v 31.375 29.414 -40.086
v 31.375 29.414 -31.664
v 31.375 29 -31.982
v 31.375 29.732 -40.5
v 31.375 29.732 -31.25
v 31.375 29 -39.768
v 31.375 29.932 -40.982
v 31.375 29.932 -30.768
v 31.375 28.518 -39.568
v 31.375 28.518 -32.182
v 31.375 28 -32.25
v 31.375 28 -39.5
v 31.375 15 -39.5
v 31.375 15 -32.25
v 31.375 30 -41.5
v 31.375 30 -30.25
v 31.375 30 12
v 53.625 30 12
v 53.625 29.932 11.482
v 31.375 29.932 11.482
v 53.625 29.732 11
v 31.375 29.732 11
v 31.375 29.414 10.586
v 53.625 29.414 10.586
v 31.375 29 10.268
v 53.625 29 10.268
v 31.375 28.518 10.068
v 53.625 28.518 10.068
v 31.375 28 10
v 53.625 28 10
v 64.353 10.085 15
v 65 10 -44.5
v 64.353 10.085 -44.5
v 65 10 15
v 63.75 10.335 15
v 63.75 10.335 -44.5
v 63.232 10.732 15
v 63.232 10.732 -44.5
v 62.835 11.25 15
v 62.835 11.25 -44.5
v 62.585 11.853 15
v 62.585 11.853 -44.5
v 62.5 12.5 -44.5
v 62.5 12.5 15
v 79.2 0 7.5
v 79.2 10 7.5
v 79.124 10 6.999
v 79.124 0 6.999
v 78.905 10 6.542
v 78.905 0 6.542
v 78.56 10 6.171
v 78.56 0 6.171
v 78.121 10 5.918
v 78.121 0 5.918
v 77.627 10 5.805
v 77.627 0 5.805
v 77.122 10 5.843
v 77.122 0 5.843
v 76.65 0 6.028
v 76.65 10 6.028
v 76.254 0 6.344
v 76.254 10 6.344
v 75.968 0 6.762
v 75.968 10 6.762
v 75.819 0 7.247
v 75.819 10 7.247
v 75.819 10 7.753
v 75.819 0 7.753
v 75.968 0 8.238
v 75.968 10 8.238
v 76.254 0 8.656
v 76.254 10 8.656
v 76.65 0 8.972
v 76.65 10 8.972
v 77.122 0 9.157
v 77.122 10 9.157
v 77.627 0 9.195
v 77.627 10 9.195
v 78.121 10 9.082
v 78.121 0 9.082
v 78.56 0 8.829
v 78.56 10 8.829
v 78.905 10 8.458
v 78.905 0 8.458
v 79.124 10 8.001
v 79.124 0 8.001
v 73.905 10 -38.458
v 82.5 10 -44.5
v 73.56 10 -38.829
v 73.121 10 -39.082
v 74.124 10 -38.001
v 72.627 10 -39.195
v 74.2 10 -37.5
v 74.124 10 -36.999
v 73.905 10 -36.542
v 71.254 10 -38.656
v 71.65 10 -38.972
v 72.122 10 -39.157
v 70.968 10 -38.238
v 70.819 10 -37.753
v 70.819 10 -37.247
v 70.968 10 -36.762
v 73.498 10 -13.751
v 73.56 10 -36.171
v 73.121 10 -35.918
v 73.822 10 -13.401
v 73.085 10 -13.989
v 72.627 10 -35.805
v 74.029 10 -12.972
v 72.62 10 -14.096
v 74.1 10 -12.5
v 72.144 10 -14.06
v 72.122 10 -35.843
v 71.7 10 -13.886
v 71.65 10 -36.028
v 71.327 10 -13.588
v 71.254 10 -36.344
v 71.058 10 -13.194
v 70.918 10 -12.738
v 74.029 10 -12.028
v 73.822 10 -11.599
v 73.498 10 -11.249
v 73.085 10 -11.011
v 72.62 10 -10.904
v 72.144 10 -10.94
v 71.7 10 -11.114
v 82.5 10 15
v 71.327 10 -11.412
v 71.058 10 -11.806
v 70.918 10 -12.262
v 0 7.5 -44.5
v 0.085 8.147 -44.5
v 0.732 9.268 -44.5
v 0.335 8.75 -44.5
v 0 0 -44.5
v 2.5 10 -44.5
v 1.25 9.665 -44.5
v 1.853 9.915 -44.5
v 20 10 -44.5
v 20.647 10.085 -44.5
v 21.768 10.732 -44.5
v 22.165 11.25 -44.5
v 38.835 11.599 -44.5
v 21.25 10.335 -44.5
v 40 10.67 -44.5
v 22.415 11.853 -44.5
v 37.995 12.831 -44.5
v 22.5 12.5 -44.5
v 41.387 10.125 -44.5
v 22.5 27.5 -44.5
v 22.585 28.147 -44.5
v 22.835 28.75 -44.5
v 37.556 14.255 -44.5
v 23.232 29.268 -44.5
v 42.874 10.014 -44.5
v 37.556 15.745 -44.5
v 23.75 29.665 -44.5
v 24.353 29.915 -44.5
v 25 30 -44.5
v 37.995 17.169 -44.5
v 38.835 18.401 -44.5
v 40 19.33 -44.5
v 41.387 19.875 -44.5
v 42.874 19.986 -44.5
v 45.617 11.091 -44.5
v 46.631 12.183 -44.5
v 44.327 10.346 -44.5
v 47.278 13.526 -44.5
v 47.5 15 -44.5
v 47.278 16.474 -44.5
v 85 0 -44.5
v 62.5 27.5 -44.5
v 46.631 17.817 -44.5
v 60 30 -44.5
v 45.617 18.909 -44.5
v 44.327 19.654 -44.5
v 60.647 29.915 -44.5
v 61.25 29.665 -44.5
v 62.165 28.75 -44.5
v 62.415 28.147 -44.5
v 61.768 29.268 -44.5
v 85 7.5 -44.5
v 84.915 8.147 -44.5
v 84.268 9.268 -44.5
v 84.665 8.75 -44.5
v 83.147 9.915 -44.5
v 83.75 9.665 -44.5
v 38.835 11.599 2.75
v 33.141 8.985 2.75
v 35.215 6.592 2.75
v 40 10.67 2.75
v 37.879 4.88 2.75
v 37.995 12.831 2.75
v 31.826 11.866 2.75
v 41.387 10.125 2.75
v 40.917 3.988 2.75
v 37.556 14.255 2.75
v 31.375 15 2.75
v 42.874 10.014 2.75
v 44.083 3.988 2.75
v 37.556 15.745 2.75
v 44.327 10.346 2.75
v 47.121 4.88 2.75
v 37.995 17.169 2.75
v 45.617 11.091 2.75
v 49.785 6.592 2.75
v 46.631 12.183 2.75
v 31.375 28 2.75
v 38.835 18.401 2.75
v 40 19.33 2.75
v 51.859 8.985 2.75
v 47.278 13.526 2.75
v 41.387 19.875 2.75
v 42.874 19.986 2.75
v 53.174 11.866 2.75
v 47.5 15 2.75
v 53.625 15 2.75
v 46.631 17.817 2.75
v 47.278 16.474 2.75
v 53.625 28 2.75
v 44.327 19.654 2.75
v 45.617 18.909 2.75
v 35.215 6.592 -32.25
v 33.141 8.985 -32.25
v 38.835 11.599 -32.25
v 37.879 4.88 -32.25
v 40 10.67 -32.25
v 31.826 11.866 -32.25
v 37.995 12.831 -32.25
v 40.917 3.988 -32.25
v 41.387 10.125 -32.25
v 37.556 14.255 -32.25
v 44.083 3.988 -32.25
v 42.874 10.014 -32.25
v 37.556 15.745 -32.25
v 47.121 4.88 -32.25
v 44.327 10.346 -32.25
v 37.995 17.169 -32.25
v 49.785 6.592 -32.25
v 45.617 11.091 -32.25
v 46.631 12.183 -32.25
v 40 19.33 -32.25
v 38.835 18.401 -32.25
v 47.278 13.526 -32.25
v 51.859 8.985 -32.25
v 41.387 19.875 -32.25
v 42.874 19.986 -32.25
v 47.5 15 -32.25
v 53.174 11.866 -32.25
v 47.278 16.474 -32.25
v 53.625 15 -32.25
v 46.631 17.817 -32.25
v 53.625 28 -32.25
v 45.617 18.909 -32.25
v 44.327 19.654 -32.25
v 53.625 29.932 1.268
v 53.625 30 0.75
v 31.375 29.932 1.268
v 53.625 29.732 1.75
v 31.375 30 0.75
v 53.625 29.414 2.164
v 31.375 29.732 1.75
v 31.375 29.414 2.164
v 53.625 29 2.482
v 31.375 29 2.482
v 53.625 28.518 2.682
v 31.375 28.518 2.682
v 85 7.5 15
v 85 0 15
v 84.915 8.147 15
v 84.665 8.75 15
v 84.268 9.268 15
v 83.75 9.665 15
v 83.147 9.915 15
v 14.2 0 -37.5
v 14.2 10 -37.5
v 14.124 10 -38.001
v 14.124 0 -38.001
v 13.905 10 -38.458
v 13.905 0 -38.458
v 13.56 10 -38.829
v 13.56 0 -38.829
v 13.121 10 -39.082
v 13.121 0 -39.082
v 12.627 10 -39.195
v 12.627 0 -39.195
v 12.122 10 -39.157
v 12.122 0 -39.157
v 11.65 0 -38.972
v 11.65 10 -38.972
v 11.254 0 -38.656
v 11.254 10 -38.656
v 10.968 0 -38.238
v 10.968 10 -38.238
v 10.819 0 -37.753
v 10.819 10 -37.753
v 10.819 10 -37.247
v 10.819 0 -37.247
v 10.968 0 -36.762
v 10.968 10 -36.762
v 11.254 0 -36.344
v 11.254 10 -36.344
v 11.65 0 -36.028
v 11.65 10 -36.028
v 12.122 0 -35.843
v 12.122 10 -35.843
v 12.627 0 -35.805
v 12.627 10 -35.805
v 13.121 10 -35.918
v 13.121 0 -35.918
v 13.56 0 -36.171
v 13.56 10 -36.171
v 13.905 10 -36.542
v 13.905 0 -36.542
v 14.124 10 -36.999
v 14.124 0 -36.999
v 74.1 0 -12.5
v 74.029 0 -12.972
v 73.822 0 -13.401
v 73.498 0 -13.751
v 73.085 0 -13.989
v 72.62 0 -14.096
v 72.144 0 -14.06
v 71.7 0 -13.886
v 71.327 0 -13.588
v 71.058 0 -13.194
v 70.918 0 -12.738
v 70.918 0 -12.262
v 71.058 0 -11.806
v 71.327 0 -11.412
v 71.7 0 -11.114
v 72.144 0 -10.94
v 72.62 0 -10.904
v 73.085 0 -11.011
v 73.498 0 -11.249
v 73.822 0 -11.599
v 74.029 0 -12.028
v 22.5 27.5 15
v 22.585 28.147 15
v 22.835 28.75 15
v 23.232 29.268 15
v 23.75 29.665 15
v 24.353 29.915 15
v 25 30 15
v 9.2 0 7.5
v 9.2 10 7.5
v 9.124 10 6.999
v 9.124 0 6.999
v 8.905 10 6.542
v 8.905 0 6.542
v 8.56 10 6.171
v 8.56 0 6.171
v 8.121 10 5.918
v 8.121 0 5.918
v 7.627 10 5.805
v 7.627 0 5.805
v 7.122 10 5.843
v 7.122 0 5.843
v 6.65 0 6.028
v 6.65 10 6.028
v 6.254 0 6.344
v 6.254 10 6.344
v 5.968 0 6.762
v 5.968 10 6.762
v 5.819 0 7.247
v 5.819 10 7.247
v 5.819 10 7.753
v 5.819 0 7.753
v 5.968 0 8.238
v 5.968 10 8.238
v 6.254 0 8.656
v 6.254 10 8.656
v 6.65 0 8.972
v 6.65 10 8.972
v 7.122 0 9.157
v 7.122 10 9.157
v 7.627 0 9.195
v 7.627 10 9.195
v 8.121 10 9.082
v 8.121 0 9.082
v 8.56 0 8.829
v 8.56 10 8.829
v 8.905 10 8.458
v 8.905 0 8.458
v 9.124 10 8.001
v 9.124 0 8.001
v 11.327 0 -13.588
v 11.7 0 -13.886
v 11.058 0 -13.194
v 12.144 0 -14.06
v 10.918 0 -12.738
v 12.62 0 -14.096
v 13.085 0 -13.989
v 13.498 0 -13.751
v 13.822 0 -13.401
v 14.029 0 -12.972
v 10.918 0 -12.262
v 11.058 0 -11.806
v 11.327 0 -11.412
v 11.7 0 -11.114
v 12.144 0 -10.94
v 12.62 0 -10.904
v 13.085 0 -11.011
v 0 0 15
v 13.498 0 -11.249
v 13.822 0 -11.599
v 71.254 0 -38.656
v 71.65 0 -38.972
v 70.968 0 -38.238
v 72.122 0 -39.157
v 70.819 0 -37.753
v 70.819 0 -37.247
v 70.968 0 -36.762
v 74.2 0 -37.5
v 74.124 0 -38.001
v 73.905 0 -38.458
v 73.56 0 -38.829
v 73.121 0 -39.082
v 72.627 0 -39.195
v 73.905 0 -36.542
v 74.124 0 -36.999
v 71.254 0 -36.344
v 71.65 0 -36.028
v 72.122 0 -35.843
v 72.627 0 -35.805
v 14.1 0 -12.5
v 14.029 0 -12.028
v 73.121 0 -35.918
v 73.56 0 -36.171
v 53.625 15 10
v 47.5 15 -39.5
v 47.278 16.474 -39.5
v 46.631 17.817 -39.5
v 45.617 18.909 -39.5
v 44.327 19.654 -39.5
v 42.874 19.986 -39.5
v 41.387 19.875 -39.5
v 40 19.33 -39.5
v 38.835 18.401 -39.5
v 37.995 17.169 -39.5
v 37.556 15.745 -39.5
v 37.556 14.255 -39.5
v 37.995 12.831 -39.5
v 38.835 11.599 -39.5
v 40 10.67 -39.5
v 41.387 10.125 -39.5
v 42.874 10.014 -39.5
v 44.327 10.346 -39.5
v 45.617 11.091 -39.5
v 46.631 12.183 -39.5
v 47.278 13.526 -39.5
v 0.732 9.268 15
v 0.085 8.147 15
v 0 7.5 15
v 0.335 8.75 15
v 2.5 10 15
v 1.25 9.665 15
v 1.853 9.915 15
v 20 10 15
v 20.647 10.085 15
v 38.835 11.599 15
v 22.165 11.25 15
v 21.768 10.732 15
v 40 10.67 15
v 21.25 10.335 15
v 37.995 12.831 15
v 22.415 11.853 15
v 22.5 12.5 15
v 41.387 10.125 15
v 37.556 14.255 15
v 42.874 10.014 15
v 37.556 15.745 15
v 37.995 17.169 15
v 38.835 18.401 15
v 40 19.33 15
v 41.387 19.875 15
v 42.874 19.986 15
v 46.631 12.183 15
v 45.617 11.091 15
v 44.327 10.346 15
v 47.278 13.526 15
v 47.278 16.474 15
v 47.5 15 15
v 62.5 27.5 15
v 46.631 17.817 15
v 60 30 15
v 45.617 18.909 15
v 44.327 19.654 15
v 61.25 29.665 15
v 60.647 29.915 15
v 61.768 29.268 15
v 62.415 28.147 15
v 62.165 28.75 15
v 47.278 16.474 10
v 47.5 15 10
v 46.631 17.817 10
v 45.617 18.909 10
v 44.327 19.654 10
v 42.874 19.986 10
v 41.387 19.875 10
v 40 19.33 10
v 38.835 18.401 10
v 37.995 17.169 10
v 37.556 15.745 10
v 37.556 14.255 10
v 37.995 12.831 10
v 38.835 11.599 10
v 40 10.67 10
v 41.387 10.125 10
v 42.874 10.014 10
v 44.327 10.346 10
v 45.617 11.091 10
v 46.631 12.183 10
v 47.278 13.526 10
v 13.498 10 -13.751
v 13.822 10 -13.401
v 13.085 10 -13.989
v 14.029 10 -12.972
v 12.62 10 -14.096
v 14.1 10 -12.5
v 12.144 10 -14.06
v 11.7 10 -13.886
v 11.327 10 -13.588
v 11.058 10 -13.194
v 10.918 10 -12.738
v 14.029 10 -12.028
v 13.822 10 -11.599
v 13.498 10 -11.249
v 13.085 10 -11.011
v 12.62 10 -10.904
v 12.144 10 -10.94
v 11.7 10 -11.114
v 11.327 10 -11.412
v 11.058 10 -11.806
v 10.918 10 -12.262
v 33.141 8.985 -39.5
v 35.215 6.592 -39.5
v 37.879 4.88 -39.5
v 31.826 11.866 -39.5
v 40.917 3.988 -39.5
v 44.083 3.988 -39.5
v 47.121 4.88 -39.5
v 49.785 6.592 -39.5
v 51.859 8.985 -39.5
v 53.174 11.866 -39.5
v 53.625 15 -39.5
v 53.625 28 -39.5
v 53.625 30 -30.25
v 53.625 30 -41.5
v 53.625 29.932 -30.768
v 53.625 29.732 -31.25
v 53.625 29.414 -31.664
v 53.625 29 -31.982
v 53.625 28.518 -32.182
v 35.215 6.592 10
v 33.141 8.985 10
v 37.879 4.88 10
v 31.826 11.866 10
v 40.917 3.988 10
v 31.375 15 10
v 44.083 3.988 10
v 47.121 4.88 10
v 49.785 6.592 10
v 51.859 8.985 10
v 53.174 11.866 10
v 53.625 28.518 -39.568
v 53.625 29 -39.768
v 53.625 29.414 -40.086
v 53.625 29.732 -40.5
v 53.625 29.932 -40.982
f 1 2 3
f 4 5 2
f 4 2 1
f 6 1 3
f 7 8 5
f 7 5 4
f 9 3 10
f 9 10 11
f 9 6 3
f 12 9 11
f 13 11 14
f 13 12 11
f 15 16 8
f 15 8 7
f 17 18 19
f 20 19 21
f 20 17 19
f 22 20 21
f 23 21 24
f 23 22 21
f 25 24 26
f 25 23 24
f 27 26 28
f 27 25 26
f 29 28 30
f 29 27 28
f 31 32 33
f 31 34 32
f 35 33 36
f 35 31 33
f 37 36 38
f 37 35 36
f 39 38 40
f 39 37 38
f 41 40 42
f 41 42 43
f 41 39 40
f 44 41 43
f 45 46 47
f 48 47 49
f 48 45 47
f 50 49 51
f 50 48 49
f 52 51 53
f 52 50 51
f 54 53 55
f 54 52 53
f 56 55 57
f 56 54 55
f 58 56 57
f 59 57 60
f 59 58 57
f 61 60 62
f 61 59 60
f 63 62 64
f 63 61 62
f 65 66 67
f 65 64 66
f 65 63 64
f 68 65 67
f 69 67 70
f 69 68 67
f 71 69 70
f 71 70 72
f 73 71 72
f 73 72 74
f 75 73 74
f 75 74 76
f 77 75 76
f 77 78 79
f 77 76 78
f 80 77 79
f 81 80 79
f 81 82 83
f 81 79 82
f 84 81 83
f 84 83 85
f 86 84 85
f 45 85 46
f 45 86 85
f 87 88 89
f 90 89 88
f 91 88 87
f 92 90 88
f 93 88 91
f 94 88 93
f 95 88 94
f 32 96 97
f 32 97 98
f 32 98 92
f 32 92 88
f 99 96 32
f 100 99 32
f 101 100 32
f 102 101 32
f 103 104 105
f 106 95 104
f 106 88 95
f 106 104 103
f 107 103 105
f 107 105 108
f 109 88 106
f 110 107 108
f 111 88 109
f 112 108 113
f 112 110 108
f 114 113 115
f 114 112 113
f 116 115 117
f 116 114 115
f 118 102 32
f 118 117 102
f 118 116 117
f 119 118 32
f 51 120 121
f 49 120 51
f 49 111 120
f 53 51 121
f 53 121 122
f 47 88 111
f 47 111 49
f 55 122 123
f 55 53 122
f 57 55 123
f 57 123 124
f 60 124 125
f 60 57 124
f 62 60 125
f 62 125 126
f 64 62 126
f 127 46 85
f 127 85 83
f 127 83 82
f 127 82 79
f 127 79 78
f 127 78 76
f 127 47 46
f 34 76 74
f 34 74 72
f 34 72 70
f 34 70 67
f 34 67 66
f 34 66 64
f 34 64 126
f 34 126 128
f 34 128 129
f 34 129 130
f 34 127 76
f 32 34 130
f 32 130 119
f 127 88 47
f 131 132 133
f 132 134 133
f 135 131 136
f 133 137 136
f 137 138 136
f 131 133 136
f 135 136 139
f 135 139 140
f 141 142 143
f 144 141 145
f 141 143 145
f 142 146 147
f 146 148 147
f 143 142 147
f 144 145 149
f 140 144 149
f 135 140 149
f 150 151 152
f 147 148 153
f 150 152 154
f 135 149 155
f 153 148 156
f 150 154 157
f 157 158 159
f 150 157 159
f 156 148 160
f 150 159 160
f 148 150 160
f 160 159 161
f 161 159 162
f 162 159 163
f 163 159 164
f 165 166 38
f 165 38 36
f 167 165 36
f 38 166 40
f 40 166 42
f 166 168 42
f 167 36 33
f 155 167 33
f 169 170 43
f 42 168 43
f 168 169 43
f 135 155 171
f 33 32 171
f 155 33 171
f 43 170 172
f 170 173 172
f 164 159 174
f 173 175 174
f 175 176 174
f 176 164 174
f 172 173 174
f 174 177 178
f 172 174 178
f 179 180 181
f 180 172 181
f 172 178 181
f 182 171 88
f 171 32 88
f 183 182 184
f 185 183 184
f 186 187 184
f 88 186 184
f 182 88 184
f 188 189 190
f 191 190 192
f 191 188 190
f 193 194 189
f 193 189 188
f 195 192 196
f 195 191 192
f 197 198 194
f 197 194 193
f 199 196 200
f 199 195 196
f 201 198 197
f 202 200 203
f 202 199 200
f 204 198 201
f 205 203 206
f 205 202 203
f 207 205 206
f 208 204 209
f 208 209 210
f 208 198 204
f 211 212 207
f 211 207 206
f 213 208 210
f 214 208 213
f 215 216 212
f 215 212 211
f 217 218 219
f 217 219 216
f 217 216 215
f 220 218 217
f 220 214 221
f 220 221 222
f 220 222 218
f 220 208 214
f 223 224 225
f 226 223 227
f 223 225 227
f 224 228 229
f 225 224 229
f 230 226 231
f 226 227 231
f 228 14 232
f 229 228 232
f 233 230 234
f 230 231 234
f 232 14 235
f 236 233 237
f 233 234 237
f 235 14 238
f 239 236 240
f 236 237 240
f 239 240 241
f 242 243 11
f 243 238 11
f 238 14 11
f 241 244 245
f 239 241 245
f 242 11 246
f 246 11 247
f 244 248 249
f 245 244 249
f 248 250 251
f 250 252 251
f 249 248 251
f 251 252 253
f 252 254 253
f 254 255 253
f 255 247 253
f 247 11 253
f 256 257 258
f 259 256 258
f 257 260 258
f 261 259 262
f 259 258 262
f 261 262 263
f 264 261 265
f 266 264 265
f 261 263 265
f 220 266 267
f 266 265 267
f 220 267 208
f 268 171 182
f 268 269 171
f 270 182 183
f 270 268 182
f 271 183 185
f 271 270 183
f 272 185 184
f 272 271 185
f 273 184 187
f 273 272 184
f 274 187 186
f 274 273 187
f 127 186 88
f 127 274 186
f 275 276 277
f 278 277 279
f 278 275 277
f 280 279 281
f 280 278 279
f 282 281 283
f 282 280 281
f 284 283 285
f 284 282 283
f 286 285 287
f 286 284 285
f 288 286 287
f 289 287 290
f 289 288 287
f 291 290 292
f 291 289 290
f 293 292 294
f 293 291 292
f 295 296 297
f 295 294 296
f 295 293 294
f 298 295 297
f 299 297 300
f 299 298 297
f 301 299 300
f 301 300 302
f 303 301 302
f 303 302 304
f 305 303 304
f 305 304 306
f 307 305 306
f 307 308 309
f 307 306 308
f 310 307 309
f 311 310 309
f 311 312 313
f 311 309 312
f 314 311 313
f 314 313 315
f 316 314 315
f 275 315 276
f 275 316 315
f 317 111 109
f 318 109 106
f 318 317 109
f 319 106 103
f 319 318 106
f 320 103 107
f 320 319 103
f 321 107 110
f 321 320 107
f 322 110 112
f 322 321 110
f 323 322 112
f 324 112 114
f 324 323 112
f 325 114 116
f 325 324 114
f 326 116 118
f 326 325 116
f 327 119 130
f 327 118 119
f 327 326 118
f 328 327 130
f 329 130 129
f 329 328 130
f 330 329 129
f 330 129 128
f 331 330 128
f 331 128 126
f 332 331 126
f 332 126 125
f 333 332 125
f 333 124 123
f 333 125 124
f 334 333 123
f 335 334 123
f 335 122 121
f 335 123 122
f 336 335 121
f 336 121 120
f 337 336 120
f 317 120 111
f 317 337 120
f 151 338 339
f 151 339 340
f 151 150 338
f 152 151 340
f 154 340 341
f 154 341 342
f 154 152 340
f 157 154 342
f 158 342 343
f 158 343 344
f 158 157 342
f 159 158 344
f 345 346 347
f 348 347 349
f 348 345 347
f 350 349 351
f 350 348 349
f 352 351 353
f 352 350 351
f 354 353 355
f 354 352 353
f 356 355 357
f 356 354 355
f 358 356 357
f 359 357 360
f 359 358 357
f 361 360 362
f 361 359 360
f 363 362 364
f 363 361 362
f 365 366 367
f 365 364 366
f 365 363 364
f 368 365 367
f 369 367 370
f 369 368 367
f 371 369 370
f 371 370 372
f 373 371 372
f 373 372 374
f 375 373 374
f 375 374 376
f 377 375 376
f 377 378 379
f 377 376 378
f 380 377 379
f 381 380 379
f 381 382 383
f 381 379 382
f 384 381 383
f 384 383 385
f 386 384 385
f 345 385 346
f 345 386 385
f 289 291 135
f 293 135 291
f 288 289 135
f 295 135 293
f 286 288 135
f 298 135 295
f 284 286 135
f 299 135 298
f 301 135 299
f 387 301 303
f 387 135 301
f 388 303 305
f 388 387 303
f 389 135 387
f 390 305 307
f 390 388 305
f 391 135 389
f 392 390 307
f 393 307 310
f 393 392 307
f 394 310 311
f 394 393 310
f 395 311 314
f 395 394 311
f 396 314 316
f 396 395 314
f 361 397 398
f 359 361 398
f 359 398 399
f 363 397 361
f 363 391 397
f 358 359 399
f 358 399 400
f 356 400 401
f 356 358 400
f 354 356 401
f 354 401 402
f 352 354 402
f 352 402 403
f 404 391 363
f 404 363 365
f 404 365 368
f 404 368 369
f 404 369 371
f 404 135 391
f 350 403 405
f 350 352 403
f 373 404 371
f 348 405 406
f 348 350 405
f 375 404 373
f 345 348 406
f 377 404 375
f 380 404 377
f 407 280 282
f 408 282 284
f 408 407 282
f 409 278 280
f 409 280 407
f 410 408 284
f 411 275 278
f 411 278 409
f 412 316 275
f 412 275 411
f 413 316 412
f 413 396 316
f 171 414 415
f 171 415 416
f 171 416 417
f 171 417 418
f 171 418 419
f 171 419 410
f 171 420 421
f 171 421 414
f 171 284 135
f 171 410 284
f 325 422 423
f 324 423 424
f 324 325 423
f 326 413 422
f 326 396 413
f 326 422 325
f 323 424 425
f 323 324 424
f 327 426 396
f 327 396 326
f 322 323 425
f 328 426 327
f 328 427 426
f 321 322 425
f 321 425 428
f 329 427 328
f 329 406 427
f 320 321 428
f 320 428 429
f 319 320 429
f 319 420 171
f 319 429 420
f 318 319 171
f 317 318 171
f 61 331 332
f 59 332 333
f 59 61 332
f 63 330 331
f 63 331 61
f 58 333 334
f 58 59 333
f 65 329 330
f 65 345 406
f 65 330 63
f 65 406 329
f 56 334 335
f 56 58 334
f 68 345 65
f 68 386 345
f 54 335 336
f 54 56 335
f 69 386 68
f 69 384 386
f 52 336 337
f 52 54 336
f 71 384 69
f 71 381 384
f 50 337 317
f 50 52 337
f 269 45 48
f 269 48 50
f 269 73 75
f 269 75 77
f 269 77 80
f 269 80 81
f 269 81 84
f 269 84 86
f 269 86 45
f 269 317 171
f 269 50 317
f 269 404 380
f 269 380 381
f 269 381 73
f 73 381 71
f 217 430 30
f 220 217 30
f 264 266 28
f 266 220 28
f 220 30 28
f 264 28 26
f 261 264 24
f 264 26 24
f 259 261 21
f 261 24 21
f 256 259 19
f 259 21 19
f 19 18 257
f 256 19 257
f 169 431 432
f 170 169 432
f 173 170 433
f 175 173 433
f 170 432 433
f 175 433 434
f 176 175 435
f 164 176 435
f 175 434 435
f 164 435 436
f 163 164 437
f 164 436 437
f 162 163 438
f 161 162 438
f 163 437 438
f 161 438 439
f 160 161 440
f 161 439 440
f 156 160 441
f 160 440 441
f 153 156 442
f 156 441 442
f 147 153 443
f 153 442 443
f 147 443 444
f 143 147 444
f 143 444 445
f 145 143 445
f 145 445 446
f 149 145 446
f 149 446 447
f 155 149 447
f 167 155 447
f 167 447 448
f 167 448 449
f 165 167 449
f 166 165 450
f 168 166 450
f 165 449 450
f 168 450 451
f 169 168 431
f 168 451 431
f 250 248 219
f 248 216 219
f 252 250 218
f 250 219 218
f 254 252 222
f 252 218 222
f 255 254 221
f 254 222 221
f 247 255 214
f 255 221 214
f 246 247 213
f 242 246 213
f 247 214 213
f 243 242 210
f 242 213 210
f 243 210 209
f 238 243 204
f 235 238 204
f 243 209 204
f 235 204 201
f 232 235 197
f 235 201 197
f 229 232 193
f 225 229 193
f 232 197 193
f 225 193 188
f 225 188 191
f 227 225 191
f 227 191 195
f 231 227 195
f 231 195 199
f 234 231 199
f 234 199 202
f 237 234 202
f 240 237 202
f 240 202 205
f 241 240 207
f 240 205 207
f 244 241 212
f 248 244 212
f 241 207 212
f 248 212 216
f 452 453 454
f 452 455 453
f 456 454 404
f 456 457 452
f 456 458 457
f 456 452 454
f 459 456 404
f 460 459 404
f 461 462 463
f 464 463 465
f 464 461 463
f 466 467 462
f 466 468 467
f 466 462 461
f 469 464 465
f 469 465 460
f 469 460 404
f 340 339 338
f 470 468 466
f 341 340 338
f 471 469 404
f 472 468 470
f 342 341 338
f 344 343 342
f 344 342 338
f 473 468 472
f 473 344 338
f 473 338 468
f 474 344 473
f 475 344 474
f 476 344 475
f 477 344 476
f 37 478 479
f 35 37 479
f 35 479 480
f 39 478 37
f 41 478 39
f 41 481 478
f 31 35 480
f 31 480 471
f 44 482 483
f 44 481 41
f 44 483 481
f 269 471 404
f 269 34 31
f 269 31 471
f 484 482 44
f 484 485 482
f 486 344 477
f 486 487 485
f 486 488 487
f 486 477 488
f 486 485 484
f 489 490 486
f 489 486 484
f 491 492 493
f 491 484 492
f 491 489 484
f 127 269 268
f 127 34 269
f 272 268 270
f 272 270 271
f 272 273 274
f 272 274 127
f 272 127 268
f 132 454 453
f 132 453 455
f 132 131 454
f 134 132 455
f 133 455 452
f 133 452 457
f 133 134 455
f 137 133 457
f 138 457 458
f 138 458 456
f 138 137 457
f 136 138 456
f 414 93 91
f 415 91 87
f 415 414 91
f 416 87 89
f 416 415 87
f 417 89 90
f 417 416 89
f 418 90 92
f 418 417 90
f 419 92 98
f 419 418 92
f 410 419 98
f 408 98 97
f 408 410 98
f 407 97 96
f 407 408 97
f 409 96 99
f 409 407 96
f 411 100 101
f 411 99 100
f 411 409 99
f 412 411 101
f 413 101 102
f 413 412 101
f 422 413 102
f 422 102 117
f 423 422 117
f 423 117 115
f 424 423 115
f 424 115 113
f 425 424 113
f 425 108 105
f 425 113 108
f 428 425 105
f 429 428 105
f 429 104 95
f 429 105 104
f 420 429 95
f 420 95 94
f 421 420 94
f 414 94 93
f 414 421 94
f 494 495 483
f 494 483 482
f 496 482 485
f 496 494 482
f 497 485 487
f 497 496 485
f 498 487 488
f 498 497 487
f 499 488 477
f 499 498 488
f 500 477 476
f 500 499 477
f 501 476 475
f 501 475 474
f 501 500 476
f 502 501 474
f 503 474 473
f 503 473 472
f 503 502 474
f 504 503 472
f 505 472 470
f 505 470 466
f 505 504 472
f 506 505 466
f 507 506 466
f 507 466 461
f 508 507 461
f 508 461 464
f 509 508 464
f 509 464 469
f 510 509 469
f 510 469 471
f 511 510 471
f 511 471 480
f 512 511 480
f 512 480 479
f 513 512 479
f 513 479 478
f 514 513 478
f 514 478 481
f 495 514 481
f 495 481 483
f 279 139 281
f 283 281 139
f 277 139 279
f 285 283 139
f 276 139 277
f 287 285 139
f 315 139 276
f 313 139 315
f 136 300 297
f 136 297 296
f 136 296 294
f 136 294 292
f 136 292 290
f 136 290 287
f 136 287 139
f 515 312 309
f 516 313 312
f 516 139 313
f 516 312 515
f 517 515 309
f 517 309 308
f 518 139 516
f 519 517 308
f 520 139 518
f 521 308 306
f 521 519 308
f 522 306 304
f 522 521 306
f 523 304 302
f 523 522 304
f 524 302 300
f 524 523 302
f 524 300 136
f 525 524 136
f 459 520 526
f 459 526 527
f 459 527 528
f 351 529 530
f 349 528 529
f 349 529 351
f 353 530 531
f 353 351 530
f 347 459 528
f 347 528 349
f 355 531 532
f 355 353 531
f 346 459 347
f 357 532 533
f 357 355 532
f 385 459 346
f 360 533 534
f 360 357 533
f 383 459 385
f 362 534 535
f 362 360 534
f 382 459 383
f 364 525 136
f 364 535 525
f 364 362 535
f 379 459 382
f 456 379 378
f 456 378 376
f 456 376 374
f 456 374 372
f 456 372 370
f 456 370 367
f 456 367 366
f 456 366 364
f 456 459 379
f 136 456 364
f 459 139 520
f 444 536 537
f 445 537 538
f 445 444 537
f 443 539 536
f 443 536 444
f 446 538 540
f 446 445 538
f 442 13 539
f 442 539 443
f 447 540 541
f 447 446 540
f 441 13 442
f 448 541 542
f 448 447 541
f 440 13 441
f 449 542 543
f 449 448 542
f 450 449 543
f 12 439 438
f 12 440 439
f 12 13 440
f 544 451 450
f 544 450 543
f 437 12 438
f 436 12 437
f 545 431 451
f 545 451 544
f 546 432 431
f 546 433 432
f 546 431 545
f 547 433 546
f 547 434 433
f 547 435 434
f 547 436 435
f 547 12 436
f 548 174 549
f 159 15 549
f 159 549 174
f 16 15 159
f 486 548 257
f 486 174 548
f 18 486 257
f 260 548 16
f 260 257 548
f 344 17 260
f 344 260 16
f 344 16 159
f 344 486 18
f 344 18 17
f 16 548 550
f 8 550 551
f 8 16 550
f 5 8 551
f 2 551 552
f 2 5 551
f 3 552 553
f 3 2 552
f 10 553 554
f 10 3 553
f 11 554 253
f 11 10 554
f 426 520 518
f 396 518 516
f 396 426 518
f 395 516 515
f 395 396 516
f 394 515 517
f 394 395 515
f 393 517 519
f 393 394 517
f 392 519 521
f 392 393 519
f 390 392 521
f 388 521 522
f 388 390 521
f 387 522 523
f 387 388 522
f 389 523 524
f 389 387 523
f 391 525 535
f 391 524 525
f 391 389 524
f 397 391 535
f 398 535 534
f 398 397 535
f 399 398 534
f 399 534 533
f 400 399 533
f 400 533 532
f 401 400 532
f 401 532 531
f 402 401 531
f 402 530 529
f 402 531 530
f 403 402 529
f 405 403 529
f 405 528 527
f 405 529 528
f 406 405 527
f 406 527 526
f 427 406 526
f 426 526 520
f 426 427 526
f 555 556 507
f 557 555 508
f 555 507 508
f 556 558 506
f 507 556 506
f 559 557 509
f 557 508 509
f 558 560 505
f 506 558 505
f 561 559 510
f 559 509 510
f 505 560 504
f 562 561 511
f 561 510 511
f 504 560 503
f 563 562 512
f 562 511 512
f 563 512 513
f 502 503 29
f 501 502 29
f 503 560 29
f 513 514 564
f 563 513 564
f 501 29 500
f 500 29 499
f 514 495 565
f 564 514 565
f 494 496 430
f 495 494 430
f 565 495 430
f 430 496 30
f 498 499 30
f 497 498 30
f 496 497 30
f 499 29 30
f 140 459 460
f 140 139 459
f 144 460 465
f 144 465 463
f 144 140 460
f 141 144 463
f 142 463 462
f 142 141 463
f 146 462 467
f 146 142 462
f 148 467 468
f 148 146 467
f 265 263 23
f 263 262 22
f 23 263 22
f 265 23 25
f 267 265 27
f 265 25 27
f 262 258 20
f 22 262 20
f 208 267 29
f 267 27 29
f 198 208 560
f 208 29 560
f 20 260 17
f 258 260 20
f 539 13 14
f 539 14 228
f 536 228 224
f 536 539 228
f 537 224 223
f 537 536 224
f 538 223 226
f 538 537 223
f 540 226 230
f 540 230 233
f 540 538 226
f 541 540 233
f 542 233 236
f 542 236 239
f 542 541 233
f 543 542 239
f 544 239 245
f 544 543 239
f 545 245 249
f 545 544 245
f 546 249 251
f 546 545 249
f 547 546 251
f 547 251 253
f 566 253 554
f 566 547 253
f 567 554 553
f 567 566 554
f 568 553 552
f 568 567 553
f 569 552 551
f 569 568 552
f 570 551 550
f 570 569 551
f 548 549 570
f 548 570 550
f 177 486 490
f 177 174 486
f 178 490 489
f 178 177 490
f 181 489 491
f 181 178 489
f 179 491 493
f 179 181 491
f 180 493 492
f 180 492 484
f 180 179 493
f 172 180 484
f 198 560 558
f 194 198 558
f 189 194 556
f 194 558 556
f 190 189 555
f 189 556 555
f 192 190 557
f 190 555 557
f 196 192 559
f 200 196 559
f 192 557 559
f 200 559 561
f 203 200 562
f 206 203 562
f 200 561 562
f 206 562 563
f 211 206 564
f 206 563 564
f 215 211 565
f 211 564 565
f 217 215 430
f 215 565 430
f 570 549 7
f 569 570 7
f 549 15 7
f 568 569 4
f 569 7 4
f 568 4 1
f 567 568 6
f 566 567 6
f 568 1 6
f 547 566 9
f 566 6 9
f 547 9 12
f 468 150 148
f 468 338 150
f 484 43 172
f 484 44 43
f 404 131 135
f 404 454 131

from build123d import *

# Parameters (mm, degrees)
SKETCH2_R                = 5
BOSS_EXTRUDE1_DEPTH      = 15
BOSS_EXTRUDE1_DEPTH_BACK = 44.5
SKETCH3_R                = 1.6
SKETCH3_R_2              = 1.7
CUT_EXTRUDE1_DEPTH       = 31
CUT_EXTRUDE1_DEPTH_BACK  = 1
FILLET1_R                = 2.5
CUT_EXTRUDE5_START       = 10
CUT_EXTRUDE5_DEPTH       = 7.25
CUT_EXTRUDE6_START       = -39.5
CUT_EXTRUDE6_DEPTH       = 7.25
FILLET2_R                = 2


with BuildPart() as part:
    # Sketch2 → Boss-Extrude1 (new body, two sides)
    with BuildSketch(Plane.XY) as boss_extrude1_sk:
        Polygon((0, 10), (0, 0), (85, 0), (85, 10), (62.5, 10), (62.5, 30), (22.5, 30), (22.5, 10), align=None)
        with Locations((42.5, 15)):
            Circle(SKETCH2_R, mode=Mode.SUBTRACT)
    extrude(amount=BOSS_EXTRUDE1_DEPTH)
    extrude(boss_extrude1_sk.sketch, amount=-BOSS_EXTRUDE1_DEPTH_BACK)

    # Sketch3 → Cut-Extrude1 (cut, two sides)
    with BuildSketch(Plane(origin=(0, 0, 0), x_dir=(1, 0, 0), z_dir=(0, 1, 0))) as cut_extrude1_sk:
        with Locations((72.5, 12.5)):
            Circle(SKETCH3_R)
        with Locations((12.5, 12.5)):
            Circle(SKETCH3_R)
        with Locations((7.5, -7.5)):
            Circle(SKETCH3_R_2)
        with Locations((77.5, -7.5)):
            Circle(SKETCH3_R_2)
        with Locations((12.5, 37.5)):
            Circle(SKETCH3_R_2)
        with Locations((72.5, 37.5)):
            Circle(SKETCH3_R_2)
    extrude(amount=CUT_EXTRUDE1_DEPTH, mode=Mode.SUBTRACT)
    extrude(cut_extrude1_sk.sketch, amount=-CUT_EXTRUDE1_DEPTH_BACK, mode=Mode.SUBTRACT)

    # Fillet1
    fillet1_edges = [part.edges().sort_by_distance(p)[0] for p in [
        (62.5, 30, -14.75),
        (62.5, 10, -14.75),
        (85, 10, -14.75),
        (0, 10, -14.75),
        (22.5, 10, -14.75),
        (22.5, 30, -14.75),
    ]]
    fillet(fillet1_edges, radius=FILLET1_R)

    # Sketch5 → Cut-Extrude5 (cut)
    with BuildSketch(Plane.XY.offset(CUT_EXTRUDE5_START)):
        with BuildLine():
            Line((31.375, 30), (31.375, 15))
            ThreePointArc((31.375, 15), (42.5, 3.875), (53.625, 15))
            Line((53.625, 15), (53.625, 30))
            Line((53.625, 30), (31.375, 30))
        make_face()
    extrude(amount=-CUT_EXTRUDE5_DEPTH, mode=Mode.SUBTRACT)

    # Sketch5<2> → Cut-Extrude6 (cut)
    with BuildSketch(Plane.XY.offset(CUT_EXTRUDE6_START)):
        with BuildLine():
            Line((31.375, 30), (31.375, 15))
            ThreePointArc((31.375, 15), (42.5, 3.875), (53.625, 15))
            Line((53.625, 15), (53.625, 30))
            Line((53.625, 30), (31.375, 30))
        make_face()
    extrude(amount=CUT_EXTRUDE6_DEPTH, mode=Mode.SUBTRACT)

    # Fillet2
    fillet2_edges = [part.edges().sort_by_distance(p)[0] for p in [
        (42.5, 30, 2.75),
        (42.5, 30, 10),
        (42.5, 30, -39.5),
        (42.5, 30, -32.25),
    ]]
    fillet(fillet2_edges, radius=FILLET2_R)


solid = part.part
